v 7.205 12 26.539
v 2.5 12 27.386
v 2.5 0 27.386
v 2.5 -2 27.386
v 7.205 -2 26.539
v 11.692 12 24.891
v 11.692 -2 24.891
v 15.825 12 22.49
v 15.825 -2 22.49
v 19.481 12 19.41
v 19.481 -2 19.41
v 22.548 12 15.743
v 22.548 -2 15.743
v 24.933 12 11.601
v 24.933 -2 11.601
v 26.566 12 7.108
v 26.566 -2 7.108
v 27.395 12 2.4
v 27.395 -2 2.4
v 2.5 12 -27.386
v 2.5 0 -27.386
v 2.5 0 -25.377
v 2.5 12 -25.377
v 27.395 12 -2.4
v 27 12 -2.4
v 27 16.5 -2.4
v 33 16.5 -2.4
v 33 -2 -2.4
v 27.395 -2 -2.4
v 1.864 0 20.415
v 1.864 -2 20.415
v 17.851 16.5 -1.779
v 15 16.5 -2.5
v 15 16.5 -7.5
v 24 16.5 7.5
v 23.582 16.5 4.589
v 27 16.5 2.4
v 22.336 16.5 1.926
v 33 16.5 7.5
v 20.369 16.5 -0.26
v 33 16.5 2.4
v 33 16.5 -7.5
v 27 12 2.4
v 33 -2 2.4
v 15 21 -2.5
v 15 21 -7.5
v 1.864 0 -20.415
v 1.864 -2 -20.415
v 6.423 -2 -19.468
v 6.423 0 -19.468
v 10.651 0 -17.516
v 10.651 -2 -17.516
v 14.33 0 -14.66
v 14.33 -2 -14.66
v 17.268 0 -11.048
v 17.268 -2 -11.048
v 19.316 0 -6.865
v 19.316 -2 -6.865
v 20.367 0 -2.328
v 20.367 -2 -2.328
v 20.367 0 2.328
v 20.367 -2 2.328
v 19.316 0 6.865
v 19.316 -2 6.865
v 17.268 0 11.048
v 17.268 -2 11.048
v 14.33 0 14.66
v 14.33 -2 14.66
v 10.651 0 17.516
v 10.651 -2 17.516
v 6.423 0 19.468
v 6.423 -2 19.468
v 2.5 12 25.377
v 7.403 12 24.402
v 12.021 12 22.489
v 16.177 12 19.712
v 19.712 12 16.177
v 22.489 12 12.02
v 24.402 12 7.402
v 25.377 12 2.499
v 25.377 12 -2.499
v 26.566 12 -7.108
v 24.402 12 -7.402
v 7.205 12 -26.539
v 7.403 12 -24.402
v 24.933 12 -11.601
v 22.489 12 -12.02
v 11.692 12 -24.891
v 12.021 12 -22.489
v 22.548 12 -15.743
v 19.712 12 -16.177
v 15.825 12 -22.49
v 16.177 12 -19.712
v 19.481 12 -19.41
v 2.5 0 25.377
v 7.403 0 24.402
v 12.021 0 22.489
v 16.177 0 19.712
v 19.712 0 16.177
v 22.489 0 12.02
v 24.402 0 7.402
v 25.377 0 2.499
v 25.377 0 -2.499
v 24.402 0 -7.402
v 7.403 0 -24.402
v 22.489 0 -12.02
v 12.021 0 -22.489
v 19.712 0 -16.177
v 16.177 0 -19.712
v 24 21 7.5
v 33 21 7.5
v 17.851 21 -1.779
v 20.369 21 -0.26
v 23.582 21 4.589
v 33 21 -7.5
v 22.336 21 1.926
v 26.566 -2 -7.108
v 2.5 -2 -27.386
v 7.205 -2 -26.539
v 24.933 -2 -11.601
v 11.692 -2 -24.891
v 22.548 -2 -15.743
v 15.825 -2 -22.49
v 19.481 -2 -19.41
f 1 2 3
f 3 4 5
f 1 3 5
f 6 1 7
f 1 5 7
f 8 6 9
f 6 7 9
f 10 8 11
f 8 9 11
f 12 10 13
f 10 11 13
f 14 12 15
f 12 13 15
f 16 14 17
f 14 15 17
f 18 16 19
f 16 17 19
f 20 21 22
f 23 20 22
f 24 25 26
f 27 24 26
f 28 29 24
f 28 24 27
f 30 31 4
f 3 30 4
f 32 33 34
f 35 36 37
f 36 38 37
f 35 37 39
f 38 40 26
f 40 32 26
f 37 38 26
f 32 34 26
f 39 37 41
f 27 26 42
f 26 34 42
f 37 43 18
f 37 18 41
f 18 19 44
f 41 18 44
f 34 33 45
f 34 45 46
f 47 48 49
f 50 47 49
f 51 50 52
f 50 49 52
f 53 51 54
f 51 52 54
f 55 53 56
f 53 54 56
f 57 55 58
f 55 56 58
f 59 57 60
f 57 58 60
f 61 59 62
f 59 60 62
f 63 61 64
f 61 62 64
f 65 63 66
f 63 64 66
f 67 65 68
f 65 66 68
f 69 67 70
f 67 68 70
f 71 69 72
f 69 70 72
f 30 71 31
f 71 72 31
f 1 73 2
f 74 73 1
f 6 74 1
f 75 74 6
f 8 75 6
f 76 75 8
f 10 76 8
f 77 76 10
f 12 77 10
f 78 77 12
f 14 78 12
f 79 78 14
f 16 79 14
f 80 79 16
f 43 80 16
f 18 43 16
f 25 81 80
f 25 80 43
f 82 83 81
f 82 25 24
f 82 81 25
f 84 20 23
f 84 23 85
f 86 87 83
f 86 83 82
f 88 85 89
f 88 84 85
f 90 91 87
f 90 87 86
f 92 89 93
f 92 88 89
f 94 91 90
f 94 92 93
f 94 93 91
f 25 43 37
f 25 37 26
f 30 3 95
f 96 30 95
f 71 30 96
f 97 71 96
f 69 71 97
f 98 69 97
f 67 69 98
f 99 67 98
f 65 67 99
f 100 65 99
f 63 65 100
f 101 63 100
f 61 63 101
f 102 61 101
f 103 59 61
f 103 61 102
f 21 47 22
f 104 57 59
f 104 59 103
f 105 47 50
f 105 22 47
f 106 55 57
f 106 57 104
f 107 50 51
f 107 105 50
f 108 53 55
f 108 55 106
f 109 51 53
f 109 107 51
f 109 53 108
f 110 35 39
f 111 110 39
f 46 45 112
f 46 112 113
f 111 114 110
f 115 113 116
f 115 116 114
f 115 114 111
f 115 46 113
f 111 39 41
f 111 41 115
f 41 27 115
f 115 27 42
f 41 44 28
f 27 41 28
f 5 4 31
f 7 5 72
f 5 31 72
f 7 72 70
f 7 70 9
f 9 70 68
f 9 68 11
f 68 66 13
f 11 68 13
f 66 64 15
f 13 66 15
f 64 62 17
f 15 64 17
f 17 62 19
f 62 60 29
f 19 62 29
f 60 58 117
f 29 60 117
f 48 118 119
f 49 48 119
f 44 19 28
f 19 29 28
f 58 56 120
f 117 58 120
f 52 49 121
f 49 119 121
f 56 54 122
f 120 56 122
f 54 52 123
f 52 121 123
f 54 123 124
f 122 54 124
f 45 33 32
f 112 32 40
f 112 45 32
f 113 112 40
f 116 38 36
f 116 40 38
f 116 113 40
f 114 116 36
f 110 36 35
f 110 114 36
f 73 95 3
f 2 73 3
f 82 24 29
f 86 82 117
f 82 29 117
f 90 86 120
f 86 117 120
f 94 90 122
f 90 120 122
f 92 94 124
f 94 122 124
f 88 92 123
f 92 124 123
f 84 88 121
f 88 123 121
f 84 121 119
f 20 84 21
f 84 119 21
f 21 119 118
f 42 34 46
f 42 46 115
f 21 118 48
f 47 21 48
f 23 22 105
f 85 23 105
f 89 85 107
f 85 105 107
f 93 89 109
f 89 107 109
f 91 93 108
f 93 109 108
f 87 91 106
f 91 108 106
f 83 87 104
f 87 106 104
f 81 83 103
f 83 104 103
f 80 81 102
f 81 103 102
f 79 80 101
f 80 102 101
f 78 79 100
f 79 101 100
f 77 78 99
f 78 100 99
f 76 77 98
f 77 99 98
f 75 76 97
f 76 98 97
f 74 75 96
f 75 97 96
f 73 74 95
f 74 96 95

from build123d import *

# Parameters (mm, degrees)
BOSS_EXTRUDE1_DEPTH      = 12
BOSS_EXTRUDE2_START      = -2
BOSS_EXTRUDE2_DEPTH      = 2
SKETCH4_W                = 6
SKETCH4_H                = 4.8
BOSS_EXTRUDE3_DEPTH      = 20
BOSS_EXTRUDE4_DEPTH      = 3
BOSS_EXTRUDE4_DEPTH_BACK = 1.5
SKETCH5_W                = 18
SKETCH5_H                = 15
CUT_EXTRUDE1_DEPTH       = 5


with BuildPart() as part:
    # Sketch1 → Boss-Extrude1 (new body)
    with BuildSketch(Plane(origin=(0, 0, 0), x_dir=(1, 0, 0), z_dir=(0, 1, 0))):
        with BuildLine():
            Line((2.5, 27.386127875), (2.5, 25.377155081))
            ThreePointArc((2.5, 25.377155081), (25.5, 0), (2.5, -25.377155081))
            Line((2.5, -25.377155081), (2.5, -27.386127875))
            ThreePointArc((2.5, -27.386127875), (27.5, 0), (2.5, 27.386127875))
        make_face()
    extrude(amount=BOSS_EXTRUDE1_DEPTH)

    # Sketch2 → Boss-Extrude2 (add)
    with BuildSketch(Plane(origin=(0, 0, 0), x_dir=(1, 0, 0), z_dir=(0, 1, 0)).offset(BOSS_EXTRUDE2_START)):
        with BuildLine():
            Line((2.5, 27.386127875), (1.863636364, 20.415113507))
            ThreePointArc((1.863636364, 20.415113507), (20.5, 0), (1.863636364, -20.415113507))
            Line((1.863636364, -20.415113507), (2.5, -27.386127875))
            ThreePointArc((2.5, -27.386127875), (27.5, 0), (2.5, 27.386127875))
        make_face()
    extrude(amount=BOSS_EXTRUDE2_DEPTH)

    # Sketch4 → Boss-Extrude3 (add)
    with BuildSketch(Plane(origin=(0, -2, 0), x_dir=(1, 0, 0), z_dir=(0, 1, 0))):
        with Locations((30, 0)):
            Rectangle(SKETCH4_W, SKETCH4_H)
    extrude(amount=BOSS_EXTRUDE3_DEPTH)

    # Sketch5 → Boss-Extrude4 (add, two sides: drawn at the far end of the back side and taken through both)
    with BuildSketch(Plane(origin=(0, 18, 0), x_dir=(1, 0, 0), z_dir=(0, 1, 0)).offset(-BOSS_EXTRUDE4_DEPTH_BACK)):
        with Locations((24, 0)):
            Rectangle(SKETCH5_W, SKETCH5_H)
    extrude(amount=BOSS_EXTRUDE4_DEPTH + BOSS_EXTRUDE4_DEPTH_BACK)

    # Sketch6 → Cut-Extrude1 (cut)
    with BuildSketch(Plane(origin=(0, 21, 0), x_dir=(1, 0, 0), z_dir=(0, 1, 0))):
        with BuildLine():
            Line((24, -7.5), (15, -7.5))
            Line((15, -7.5), (15, 2.5))
            ThreePointArc((15, 2.5), (21.433067029, -0.760239674), (24, -7.5))
        make_face()
    extrude(amount=-CUT_EXTRUDE1_DEPTH, mode=Mode.SUBTRACT)


solid = part.part
